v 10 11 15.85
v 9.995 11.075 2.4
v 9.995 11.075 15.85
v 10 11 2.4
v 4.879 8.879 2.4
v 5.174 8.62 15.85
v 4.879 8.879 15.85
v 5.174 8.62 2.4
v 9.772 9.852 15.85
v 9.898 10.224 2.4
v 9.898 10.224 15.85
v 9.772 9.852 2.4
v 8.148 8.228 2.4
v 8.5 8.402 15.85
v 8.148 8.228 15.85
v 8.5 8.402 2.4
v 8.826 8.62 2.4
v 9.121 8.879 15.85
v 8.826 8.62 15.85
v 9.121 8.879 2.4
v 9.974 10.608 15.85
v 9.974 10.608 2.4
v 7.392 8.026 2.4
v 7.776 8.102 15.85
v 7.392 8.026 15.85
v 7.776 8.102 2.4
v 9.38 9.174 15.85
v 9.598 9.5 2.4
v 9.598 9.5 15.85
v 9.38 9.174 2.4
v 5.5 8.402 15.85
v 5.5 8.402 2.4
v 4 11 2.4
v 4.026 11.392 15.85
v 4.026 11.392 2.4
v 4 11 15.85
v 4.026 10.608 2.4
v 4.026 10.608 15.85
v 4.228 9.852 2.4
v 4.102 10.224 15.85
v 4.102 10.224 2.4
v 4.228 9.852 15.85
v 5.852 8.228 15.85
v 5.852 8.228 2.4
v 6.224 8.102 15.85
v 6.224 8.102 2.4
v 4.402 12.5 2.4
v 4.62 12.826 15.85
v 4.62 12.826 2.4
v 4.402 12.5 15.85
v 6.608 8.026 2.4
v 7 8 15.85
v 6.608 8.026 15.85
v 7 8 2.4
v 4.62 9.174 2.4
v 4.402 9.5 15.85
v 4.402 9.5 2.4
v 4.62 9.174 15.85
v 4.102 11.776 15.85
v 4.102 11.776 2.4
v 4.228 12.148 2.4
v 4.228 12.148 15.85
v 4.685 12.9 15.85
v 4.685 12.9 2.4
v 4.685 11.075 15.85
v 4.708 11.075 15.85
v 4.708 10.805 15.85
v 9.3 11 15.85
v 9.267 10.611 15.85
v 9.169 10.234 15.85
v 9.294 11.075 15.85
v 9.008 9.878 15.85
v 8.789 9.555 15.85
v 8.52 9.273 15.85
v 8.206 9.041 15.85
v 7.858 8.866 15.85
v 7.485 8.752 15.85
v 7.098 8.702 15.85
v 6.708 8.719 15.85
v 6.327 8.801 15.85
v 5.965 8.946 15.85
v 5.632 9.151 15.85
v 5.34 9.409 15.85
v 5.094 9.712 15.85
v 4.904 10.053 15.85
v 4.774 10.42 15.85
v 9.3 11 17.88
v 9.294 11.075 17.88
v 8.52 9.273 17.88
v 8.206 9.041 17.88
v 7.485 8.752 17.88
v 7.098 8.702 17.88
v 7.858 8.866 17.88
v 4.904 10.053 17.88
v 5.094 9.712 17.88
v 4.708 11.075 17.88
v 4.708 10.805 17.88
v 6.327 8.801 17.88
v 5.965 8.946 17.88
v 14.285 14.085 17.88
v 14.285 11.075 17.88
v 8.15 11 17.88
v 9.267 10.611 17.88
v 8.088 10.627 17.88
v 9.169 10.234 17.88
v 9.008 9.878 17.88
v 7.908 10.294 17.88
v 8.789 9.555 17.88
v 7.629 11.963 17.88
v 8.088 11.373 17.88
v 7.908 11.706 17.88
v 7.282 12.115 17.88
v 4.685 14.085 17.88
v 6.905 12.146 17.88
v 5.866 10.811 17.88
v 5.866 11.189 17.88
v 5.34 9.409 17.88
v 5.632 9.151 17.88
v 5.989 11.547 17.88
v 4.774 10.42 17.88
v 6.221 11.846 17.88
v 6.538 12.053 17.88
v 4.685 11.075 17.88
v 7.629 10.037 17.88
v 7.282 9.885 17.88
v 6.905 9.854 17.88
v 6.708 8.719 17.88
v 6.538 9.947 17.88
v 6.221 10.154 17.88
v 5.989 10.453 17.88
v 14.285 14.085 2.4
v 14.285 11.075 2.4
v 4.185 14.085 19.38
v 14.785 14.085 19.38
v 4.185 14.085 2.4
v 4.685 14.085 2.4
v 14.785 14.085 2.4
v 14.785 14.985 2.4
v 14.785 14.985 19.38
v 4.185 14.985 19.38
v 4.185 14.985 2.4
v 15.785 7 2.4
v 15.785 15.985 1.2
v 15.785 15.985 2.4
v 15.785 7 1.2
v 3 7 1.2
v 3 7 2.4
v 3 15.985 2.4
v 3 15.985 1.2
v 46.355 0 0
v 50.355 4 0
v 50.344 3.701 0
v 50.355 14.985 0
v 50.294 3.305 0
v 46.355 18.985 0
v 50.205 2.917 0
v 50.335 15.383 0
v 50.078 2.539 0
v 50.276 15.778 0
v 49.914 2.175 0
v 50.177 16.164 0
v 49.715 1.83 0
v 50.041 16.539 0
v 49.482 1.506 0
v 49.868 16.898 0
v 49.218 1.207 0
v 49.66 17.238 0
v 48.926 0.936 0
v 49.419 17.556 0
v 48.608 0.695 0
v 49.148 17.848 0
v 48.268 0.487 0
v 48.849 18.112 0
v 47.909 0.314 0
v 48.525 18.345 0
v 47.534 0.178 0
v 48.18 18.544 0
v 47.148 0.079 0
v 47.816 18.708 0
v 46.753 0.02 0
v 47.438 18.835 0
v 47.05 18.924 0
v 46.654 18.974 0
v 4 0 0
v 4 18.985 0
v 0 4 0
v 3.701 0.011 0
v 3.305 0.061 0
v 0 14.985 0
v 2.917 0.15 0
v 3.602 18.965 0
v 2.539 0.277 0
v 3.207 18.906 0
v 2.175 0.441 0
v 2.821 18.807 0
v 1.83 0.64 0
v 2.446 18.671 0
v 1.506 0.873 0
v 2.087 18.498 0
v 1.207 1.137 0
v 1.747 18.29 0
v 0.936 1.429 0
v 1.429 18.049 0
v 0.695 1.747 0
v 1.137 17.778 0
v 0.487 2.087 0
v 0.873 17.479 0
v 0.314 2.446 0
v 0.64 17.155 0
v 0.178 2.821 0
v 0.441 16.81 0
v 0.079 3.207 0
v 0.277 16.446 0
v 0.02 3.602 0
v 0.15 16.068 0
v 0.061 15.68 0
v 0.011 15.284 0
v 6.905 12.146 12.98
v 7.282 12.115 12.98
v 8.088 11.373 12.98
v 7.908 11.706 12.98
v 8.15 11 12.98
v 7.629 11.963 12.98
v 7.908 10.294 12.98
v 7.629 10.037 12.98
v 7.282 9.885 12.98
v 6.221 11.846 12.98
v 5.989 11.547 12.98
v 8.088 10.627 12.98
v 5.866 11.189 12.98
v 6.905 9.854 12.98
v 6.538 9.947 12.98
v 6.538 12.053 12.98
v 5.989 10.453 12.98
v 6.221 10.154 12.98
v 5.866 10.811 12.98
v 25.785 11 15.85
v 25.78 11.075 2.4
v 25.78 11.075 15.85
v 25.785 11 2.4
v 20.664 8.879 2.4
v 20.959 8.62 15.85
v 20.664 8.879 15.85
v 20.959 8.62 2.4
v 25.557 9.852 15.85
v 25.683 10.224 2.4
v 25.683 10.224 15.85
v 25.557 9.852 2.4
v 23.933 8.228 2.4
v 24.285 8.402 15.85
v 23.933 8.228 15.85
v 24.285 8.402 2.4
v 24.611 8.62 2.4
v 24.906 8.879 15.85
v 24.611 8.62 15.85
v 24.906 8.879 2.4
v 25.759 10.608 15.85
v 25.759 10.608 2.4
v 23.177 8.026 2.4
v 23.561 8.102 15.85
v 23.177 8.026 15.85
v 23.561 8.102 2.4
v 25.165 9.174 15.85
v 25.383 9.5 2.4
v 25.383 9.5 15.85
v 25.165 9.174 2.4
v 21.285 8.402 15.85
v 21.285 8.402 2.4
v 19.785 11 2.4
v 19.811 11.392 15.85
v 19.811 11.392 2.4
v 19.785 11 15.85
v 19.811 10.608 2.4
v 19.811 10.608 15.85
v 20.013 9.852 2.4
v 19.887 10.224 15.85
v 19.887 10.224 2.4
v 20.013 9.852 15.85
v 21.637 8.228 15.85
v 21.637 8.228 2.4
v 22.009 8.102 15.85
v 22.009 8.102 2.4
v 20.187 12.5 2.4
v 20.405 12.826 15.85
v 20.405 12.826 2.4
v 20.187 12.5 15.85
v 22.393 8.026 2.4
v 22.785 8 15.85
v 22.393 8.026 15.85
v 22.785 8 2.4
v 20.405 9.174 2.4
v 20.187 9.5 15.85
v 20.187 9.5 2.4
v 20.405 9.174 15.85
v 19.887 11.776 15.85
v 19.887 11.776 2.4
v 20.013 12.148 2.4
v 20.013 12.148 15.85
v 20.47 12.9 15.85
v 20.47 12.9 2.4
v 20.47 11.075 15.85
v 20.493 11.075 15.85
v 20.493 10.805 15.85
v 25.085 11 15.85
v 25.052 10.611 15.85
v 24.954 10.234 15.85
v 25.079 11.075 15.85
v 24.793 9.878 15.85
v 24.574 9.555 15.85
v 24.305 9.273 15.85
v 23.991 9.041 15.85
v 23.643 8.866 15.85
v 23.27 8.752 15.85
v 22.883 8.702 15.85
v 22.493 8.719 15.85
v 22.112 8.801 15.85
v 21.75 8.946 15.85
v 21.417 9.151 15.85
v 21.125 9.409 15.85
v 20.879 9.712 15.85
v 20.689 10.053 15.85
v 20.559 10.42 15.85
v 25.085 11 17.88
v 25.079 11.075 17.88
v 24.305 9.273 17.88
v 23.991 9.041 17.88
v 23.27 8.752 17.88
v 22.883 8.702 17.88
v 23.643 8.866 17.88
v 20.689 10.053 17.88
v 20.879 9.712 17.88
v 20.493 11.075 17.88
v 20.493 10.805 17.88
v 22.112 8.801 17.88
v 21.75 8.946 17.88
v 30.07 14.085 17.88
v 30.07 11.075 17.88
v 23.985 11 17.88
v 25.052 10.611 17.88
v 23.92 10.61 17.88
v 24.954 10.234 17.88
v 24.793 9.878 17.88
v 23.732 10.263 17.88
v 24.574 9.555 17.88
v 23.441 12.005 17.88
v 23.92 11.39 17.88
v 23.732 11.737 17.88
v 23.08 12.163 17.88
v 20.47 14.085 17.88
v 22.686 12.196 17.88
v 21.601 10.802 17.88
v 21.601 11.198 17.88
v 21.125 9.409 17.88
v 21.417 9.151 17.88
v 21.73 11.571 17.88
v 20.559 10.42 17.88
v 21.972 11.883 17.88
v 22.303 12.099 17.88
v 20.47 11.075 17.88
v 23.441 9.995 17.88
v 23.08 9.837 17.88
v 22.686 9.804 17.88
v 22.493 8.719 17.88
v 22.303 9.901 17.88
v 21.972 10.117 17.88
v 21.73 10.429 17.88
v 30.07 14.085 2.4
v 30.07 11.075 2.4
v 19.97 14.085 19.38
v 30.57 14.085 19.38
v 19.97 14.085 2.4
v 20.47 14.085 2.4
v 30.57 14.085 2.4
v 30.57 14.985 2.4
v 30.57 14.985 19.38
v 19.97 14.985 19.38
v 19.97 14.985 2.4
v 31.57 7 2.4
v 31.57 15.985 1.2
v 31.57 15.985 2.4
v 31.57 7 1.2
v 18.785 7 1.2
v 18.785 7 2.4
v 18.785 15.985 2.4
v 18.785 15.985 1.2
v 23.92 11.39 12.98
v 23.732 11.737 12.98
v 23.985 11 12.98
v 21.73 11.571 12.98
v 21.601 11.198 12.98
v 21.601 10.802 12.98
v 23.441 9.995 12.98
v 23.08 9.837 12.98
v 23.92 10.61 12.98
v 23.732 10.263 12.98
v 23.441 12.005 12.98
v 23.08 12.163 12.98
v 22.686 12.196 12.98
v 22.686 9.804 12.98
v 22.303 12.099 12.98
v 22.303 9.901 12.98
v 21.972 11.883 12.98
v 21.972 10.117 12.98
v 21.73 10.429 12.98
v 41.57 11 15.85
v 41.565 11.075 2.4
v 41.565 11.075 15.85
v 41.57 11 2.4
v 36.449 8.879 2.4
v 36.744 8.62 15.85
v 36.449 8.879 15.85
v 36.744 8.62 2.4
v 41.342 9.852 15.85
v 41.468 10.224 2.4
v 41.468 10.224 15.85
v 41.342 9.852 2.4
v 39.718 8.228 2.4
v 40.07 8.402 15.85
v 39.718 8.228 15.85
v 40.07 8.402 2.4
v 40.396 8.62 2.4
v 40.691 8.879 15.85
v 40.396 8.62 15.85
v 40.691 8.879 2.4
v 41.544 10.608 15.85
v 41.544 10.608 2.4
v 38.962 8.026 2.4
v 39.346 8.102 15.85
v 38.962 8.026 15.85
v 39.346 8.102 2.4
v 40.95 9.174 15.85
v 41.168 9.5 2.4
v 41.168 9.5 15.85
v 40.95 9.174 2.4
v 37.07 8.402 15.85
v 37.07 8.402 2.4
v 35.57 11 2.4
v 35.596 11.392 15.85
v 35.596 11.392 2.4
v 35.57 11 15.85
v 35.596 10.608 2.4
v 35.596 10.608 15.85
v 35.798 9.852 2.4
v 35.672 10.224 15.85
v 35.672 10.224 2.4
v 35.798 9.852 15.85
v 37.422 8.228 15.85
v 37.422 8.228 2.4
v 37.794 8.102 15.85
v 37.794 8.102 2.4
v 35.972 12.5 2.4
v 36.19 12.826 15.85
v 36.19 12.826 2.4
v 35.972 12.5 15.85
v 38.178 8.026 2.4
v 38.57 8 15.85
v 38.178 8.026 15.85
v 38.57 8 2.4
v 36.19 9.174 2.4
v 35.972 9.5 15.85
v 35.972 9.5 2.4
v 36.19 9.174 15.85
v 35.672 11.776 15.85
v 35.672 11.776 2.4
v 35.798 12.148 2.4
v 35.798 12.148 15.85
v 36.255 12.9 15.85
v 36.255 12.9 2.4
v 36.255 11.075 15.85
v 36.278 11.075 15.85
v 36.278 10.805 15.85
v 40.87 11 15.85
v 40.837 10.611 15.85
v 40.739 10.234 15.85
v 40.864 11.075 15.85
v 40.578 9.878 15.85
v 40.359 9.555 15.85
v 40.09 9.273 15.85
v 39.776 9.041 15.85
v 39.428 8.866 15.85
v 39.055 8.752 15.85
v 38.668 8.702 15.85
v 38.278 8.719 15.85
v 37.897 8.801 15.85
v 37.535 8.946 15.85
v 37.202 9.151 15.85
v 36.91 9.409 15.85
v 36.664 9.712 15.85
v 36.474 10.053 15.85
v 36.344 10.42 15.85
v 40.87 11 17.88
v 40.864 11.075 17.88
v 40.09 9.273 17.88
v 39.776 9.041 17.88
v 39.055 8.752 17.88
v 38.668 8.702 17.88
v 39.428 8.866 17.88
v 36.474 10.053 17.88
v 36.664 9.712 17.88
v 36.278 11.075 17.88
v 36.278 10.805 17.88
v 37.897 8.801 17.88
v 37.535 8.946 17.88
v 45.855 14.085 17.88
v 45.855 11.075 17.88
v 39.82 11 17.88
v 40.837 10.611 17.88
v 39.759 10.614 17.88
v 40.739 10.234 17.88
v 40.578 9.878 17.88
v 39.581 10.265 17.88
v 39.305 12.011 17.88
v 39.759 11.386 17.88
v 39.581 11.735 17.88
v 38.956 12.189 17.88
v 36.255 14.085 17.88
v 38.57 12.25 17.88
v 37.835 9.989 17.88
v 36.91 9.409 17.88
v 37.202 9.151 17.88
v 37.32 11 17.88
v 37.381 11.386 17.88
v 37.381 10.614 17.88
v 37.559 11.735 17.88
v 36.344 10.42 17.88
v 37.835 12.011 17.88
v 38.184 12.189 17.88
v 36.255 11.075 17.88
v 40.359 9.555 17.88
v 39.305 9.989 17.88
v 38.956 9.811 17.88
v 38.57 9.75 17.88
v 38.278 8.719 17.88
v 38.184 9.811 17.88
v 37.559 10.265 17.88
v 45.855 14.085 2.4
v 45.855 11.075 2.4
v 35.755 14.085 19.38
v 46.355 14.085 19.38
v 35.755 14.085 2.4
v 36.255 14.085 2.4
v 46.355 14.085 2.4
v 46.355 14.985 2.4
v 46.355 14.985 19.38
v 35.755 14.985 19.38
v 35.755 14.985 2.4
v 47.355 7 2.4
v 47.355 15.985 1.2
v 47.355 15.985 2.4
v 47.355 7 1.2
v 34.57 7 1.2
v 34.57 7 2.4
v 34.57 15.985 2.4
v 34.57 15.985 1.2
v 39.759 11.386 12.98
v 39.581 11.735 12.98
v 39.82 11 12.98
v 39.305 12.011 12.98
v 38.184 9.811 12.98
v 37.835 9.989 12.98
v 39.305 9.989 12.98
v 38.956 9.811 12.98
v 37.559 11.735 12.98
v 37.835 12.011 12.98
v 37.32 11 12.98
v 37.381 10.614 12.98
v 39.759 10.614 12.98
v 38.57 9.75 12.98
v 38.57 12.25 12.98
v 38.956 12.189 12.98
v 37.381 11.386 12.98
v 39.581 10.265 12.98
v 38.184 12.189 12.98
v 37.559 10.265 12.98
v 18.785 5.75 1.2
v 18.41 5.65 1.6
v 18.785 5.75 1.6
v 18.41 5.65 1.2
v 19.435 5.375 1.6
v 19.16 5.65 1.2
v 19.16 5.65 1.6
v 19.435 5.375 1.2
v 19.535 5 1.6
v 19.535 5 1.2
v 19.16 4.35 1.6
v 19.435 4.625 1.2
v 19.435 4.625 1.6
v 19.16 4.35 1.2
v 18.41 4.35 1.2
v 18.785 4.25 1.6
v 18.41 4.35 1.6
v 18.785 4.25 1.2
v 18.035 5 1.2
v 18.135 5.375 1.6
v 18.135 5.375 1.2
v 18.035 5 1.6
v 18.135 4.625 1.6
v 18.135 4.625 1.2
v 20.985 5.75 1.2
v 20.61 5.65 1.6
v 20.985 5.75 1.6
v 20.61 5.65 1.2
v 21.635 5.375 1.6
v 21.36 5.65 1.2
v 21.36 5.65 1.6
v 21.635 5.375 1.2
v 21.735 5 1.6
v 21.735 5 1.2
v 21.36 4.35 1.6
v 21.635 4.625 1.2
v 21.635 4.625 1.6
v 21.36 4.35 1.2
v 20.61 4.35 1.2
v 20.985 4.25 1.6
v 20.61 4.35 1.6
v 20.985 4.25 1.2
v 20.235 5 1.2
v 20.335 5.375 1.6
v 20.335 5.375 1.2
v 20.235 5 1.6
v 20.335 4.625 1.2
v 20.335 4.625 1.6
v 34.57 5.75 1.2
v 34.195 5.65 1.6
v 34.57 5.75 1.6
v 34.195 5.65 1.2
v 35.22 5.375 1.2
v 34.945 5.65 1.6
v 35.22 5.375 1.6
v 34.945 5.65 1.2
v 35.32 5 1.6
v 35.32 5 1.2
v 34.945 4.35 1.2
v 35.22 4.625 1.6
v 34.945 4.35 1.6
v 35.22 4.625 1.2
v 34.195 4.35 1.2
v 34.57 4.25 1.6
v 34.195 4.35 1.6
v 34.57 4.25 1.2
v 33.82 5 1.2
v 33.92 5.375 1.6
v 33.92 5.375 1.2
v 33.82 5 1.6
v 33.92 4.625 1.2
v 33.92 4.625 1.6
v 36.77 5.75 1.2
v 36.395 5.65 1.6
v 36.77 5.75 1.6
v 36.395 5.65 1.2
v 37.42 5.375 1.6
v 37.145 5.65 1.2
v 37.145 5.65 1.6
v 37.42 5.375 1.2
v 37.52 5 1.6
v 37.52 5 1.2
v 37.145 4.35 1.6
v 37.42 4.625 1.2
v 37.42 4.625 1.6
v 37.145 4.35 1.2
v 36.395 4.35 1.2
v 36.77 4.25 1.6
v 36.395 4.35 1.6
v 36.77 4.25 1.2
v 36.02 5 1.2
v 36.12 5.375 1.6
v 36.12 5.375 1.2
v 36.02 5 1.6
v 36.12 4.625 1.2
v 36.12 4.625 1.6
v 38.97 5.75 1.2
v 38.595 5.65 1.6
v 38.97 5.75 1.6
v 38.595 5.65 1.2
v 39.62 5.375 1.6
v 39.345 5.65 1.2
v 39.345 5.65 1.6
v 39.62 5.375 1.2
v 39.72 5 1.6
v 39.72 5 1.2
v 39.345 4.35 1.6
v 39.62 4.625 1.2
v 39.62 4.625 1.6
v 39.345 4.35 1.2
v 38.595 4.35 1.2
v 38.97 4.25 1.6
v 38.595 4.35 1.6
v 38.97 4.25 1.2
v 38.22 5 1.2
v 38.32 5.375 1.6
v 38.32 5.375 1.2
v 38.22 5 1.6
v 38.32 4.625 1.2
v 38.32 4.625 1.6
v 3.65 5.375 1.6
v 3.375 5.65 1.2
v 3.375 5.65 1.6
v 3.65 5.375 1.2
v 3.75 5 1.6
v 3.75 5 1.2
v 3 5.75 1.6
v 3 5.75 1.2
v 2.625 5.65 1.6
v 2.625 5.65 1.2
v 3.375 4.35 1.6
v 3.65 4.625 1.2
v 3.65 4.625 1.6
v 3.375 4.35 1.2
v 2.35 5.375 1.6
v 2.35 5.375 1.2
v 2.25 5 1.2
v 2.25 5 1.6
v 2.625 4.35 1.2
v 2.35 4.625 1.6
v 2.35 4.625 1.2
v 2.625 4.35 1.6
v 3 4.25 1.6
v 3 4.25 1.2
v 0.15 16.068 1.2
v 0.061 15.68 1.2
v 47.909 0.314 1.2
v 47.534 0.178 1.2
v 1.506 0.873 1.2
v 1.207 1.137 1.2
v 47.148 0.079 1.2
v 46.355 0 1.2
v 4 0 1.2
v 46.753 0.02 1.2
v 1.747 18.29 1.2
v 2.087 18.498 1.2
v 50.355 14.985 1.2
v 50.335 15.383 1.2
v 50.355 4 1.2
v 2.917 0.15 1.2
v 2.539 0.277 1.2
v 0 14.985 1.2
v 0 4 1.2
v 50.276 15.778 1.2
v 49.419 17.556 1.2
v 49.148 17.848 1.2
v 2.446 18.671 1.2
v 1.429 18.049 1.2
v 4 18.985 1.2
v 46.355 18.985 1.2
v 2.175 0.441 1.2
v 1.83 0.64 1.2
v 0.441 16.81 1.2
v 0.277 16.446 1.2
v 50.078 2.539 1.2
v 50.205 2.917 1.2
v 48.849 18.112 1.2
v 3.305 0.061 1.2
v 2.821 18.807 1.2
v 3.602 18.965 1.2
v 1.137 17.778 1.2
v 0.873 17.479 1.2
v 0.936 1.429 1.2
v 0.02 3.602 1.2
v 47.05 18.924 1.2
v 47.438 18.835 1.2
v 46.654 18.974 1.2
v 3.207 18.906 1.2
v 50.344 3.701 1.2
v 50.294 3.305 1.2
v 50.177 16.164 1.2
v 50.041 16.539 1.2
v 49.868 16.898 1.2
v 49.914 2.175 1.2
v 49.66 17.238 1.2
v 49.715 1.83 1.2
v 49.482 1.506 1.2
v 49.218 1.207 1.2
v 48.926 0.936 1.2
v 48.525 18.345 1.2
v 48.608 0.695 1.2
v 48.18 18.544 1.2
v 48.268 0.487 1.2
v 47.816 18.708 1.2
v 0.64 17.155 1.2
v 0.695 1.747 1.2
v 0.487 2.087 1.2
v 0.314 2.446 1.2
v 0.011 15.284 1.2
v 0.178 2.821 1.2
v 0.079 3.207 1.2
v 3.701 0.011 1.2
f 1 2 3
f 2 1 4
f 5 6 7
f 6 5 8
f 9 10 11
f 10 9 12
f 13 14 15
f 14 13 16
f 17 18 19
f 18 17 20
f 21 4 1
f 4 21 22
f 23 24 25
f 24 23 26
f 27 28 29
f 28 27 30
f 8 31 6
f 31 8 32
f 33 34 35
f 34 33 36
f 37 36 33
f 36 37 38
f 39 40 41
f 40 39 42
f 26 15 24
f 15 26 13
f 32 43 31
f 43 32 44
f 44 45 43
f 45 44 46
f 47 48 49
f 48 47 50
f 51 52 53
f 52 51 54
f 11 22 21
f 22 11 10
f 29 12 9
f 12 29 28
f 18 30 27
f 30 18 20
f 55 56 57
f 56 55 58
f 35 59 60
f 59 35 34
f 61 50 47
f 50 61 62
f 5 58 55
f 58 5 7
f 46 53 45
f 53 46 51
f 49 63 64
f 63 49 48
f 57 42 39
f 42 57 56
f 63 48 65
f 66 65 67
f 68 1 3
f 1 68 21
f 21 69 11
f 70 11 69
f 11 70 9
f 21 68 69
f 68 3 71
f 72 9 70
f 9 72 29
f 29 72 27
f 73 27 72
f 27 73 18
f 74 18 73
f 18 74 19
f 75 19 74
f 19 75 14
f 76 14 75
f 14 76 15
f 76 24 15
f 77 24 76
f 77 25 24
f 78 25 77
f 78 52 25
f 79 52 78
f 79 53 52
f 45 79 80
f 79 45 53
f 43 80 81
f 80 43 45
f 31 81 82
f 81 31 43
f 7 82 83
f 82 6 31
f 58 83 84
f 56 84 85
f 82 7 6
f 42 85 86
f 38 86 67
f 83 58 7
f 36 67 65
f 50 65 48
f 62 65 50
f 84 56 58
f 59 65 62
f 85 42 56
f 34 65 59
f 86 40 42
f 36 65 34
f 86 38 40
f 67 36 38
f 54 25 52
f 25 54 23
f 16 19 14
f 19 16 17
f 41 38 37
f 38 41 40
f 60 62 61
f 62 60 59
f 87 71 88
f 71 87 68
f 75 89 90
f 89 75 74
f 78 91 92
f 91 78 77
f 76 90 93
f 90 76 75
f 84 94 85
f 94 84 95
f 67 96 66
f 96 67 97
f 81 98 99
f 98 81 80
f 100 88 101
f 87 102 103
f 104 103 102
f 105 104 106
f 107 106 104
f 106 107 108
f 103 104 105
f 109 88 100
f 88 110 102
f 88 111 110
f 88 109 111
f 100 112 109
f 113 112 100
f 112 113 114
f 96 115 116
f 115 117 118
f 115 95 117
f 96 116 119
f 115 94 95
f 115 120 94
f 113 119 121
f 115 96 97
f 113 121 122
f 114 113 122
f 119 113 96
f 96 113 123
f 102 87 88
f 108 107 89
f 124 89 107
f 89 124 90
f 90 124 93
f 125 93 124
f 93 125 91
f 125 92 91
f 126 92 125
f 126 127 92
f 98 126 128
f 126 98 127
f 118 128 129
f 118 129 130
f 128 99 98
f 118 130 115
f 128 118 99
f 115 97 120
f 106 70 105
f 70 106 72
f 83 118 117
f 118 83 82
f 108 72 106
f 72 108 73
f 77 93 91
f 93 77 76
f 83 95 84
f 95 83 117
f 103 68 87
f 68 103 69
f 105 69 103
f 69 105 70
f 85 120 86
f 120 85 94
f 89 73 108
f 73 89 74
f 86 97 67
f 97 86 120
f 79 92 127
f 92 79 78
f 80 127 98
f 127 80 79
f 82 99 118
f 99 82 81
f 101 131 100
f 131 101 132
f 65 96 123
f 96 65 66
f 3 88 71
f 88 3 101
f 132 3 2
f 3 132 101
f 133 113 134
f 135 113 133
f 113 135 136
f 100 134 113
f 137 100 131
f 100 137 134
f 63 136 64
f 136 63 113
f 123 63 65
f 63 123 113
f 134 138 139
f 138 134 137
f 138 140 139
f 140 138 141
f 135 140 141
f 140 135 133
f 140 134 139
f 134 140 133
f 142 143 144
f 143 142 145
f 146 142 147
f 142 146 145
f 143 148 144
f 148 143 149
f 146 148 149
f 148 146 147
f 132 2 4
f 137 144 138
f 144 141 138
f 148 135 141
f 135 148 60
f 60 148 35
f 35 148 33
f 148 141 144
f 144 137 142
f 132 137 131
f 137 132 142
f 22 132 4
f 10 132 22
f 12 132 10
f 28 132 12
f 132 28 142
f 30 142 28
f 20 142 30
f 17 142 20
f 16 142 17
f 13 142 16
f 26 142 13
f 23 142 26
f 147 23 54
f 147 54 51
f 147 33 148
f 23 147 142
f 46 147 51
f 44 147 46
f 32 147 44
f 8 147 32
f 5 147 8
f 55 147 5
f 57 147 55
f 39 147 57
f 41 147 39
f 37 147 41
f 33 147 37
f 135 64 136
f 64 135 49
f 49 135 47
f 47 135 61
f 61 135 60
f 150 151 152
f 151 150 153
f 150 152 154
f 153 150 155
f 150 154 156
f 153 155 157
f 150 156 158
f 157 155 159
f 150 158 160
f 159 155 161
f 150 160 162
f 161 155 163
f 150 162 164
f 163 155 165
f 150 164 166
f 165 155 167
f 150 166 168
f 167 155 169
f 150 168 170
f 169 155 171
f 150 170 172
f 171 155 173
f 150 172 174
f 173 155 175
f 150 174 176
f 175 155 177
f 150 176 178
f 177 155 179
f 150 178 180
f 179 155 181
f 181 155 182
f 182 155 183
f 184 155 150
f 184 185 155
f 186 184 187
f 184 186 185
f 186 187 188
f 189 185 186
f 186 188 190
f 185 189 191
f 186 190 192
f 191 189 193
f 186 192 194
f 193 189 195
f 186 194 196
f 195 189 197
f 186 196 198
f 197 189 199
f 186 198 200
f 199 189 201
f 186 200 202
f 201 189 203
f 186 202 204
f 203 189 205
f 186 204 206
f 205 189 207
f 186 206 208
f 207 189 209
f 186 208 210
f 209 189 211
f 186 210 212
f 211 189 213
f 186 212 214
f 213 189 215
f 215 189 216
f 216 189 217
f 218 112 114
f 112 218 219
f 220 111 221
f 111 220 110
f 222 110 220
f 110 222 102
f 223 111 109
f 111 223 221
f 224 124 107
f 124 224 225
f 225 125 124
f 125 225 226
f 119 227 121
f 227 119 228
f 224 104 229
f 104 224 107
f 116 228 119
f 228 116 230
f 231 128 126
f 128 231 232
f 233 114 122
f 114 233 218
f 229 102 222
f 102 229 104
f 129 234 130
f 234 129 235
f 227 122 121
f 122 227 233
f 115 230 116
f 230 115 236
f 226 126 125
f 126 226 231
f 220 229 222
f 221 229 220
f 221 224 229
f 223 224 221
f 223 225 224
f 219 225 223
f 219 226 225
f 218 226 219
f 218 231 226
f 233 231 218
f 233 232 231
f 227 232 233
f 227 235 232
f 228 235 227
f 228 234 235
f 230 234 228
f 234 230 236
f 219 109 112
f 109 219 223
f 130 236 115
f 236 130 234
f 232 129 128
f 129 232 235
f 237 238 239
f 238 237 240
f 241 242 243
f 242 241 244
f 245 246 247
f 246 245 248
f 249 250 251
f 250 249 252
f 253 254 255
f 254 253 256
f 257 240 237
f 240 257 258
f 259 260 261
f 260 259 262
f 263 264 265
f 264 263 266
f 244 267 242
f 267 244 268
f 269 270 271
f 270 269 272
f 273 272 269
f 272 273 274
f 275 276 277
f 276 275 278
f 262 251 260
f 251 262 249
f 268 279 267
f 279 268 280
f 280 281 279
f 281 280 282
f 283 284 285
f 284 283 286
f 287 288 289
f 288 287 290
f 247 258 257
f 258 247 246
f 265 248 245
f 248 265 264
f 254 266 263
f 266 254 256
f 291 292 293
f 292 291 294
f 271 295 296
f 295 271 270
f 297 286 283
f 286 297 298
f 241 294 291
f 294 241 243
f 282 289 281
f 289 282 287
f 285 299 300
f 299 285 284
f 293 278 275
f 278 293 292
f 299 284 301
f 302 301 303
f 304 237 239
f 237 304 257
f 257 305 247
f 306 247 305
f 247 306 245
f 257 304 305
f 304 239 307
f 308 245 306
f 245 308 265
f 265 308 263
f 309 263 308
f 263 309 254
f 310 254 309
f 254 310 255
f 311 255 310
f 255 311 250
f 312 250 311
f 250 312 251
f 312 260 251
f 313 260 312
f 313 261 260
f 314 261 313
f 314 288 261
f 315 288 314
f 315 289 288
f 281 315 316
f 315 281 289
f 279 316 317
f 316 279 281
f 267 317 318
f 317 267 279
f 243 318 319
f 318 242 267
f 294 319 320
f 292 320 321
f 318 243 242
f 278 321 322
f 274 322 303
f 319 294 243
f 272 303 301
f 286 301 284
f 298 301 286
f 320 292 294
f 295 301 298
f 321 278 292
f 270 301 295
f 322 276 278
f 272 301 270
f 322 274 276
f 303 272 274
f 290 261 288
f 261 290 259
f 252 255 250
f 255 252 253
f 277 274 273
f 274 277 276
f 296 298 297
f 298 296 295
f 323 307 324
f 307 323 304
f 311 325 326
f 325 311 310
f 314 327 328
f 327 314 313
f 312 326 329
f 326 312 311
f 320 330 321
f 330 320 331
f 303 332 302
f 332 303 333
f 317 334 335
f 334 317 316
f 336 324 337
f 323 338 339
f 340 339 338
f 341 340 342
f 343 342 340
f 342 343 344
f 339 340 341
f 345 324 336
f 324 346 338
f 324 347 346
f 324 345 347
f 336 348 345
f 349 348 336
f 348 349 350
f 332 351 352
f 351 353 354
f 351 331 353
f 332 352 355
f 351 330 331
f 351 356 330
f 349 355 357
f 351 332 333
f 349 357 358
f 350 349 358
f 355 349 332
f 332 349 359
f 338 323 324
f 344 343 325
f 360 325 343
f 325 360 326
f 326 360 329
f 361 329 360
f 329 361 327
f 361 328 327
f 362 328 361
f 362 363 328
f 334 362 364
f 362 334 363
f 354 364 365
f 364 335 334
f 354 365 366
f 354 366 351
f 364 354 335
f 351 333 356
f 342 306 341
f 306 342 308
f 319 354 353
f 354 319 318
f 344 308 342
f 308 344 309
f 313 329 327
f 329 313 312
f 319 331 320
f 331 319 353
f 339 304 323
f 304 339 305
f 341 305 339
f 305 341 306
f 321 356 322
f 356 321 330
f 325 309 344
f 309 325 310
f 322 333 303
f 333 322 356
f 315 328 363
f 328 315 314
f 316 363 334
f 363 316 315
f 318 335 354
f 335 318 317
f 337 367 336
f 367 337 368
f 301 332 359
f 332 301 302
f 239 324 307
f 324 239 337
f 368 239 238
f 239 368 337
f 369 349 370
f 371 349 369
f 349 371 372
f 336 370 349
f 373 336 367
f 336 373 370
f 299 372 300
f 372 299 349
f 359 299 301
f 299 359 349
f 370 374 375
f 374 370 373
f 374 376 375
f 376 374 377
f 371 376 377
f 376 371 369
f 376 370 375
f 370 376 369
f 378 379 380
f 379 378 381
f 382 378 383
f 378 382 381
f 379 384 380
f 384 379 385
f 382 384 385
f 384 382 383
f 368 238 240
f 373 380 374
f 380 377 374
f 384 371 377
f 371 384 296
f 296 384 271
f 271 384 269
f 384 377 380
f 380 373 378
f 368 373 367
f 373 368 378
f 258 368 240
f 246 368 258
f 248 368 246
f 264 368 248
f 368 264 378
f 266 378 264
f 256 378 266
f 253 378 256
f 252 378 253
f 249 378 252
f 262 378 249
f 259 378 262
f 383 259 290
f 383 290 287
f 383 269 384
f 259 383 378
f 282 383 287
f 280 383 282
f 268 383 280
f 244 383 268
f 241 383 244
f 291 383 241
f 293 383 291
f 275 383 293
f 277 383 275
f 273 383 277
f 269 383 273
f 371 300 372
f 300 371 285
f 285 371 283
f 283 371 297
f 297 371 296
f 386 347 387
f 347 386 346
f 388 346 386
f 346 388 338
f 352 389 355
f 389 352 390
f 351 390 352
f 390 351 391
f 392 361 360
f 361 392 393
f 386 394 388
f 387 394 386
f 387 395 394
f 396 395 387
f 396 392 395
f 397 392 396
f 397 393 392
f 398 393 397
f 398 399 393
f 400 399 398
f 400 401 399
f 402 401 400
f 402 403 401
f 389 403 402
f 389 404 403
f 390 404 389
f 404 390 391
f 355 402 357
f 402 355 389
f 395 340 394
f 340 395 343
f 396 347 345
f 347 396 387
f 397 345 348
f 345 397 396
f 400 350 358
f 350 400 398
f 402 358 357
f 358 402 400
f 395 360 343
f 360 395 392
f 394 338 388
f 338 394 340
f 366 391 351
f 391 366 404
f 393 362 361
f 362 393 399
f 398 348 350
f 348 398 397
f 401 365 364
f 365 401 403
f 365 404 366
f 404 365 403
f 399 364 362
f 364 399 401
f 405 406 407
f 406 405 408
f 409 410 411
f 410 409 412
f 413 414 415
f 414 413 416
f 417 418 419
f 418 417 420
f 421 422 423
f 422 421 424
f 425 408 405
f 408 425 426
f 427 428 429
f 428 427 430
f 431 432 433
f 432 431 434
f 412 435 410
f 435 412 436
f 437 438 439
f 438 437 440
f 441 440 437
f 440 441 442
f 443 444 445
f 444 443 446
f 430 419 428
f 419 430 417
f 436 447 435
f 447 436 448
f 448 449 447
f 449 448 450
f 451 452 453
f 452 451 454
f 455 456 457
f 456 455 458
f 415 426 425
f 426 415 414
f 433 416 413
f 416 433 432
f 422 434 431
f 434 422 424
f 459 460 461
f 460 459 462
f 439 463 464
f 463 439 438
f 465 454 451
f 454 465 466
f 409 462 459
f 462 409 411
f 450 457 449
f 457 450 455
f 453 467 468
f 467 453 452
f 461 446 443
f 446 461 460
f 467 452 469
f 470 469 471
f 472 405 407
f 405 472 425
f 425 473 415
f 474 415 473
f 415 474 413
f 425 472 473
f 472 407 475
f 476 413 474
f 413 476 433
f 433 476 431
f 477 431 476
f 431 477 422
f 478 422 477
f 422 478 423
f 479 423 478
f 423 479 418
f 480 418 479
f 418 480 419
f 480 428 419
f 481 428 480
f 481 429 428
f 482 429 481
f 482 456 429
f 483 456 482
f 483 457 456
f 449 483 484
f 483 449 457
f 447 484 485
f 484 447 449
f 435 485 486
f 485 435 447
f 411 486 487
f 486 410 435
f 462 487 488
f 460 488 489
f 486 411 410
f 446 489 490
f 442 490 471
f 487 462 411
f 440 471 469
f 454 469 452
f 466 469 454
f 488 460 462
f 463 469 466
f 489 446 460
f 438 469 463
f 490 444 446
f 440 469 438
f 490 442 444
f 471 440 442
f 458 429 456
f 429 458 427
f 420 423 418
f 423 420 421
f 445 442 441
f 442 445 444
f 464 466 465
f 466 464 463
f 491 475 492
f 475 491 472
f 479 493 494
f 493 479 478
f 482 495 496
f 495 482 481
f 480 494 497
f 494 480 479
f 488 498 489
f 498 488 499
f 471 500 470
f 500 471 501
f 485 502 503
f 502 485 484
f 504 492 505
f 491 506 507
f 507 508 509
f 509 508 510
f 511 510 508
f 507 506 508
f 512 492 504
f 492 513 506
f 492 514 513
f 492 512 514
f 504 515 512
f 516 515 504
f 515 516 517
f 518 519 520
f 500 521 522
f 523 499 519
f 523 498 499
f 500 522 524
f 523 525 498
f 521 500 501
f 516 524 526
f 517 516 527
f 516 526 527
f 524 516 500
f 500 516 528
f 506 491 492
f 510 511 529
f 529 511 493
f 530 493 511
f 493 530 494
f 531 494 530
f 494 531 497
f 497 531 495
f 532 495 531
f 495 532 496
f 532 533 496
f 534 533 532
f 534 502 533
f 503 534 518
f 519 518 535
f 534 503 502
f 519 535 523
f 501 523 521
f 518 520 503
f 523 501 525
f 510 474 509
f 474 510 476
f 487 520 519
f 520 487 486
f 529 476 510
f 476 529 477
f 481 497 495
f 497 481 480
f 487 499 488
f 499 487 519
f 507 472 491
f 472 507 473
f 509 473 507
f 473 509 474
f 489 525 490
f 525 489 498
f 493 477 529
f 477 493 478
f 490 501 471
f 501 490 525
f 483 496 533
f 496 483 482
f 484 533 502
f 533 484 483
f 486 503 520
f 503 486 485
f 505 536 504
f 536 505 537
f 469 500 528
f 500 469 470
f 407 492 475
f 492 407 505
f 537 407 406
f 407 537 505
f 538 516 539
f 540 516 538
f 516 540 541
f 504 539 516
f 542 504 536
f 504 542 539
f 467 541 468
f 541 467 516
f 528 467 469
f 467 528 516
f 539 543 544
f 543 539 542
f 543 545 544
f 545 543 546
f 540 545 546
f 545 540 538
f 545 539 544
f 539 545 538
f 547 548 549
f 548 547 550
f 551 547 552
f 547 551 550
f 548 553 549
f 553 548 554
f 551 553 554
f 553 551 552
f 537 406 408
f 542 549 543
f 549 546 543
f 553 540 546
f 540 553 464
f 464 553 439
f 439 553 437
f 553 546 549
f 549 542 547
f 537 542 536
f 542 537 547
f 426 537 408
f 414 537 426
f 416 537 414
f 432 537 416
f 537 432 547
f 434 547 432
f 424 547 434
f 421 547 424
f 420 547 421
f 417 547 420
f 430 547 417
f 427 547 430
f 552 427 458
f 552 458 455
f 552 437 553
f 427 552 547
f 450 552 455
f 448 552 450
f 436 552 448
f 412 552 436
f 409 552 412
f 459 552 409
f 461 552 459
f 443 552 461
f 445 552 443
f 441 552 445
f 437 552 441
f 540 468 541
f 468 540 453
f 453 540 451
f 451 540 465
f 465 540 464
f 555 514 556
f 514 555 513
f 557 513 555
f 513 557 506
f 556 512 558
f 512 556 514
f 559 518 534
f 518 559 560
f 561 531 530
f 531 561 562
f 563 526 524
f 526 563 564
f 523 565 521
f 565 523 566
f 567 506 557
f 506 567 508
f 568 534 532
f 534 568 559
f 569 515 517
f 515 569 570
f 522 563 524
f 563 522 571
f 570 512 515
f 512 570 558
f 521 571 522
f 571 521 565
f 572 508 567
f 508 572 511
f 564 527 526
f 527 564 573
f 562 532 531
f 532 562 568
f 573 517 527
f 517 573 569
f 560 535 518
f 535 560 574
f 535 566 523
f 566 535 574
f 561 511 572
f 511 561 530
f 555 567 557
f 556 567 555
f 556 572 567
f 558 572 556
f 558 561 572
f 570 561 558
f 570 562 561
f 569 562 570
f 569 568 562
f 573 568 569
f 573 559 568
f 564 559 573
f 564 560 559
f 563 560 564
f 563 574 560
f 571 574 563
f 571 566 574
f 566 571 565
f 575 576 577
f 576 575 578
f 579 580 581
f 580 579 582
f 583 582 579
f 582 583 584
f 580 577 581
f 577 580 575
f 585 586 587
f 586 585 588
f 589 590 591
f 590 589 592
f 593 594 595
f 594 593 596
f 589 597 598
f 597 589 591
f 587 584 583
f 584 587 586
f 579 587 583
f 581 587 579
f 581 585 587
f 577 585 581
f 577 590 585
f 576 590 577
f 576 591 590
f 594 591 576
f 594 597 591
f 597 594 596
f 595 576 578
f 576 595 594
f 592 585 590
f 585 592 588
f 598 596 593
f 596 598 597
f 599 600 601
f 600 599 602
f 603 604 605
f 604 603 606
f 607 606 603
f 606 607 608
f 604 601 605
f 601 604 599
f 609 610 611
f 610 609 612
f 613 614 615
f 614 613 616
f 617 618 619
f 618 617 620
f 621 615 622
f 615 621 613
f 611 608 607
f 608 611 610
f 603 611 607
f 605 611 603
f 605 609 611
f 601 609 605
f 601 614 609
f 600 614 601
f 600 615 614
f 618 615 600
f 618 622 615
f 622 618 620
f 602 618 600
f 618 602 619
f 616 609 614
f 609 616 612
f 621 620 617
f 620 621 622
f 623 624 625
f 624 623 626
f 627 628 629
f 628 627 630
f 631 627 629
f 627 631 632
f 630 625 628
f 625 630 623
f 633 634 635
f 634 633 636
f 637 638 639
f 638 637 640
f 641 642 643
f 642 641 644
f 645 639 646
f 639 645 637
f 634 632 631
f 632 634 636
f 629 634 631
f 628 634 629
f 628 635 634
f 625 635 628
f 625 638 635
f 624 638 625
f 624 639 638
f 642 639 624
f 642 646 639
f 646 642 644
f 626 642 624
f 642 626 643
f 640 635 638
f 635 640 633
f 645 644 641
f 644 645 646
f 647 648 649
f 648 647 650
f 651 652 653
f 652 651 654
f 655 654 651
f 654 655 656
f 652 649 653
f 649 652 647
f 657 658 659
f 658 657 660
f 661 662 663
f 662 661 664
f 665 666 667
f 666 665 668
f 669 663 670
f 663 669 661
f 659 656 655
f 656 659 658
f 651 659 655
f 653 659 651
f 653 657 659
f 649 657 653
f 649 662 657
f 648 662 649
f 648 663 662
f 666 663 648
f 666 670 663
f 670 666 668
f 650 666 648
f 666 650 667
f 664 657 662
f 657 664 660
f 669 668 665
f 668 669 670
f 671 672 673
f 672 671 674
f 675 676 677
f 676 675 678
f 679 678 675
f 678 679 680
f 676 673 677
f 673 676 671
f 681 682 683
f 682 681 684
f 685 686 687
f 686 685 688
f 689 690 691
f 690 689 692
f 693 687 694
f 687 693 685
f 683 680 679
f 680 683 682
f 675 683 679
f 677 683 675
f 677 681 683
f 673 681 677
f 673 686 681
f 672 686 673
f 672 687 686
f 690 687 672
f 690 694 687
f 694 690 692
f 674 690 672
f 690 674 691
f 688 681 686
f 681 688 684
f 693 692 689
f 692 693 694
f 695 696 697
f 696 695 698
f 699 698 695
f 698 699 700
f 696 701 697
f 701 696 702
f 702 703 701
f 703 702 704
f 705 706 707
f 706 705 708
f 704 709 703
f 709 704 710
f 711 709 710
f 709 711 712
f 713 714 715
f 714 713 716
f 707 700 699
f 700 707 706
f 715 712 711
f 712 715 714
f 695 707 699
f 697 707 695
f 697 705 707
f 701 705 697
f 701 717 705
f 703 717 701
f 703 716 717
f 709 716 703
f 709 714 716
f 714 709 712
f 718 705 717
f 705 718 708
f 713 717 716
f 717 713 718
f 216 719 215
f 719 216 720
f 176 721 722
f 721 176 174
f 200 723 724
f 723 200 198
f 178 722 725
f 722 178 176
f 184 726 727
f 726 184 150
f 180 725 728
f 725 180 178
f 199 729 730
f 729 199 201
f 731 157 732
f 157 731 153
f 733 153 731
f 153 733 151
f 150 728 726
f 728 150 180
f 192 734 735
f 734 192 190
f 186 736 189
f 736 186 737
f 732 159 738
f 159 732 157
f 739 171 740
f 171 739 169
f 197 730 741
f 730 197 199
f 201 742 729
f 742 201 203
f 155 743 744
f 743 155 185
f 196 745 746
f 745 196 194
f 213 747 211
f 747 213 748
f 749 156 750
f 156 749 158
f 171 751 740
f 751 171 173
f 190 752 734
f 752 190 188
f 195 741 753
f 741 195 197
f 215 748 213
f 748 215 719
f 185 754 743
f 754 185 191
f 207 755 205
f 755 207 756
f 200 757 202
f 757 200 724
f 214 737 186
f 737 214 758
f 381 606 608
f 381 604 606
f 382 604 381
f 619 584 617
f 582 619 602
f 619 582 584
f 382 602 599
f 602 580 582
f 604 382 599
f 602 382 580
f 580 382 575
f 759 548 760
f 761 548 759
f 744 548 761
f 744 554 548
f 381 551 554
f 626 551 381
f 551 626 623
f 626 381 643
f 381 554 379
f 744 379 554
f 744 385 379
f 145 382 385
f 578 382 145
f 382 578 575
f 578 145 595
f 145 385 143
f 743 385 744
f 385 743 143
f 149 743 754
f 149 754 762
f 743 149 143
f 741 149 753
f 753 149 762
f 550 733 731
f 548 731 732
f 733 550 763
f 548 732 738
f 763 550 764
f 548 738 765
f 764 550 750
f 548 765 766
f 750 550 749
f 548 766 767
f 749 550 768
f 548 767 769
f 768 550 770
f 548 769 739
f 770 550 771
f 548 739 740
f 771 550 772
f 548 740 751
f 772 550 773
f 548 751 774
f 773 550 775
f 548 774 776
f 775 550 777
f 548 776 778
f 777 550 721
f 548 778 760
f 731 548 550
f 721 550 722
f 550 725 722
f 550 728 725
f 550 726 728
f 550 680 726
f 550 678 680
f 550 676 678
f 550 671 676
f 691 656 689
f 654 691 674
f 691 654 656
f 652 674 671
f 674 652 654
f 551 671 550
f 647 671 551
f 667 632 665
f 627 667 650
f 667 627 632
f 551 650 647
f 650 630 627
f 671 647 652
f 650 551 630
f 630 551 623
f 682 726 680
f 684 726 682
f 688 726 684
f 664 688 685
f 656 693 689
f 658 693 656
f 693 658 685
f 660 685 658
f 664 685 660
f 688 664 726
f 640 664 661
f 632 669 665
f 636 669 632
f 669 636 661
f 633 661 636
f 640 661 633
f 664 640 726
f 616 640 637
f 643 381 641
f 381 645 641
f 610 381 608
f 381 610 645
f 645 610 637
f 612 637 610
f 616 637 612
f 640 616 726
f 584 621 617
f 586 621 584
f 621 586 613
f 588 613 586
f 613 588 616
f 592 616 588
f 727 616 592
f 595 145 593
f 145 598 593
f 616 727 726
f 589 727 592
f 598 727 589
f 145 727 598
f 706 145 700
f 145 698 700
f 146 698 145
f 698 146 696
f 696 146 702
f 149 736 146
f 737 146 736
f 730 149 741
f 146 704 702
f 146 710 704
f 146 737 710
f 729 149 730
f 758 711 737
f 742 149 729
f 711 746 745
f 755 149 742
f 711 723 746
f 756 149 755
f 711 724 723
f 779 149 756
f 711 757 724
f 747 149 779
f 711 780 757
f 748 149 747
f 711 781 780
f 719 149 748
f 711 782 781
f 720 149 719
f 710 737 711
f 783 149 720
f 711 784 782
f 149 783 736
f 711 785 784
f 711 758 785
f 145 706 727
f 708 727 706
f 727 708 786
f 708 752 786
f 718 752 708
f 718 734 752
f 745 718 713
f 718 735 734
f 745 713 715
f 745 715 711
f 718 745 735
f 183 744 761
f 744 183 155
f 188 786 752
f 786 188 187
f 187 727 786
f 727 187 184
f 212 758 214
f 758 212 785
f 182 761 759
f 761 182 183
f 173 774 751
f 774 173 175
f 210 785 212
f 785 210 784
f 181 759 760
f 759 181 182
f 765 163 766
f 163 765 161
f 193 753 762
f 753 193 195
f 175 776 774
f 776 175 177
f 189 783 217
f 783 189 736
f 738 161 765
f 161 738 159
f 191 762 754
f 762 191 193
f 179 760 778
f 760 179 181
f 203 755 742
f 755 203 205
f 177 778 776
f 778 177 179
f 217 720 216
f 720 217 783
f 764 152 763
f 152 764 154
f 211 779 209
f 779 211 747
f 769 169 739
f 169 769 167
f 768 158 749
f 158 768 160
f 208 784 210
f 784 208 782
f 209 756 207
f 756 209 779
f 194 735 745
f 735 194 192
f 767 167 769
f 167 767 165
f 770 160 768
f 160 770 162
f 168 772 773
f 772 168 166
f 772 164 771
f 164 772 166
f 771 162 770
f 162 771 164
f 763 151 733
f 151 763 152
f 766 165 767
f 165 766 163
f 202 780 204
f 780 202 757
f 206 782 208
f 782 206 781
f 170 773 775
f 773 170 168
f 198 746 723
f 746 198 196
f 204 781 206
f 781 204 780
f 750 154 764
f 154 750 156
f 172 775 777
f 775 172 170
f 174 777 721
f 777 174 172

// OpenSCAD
// SPDX-FileCopyrightText: 2026 Alon A. Rabinowitz
// SPDX-License-Identifier: CERN-OHL-S-2.0
// Open hardware, made available under the CERN Open Hardware Licence v2 - Strongly Reciprocal
// (LICENSES/CERN-OHL-S-2.0.txt), without any express or implied warranty: see the licence for its conditions.

/*
The clearance test for the air-quality monitor: one small print that tries every untested fit in
air-quality-monitor.params.scad at three settings - a step tighter, as set, and a step looser - so the box
is printed with fits that were tried in ASA on this printer rather than guessed.

It INCLUDES the box, and every piece is the box's own geometry, drawn by the box's own modules with only
the fit changed and turned onto the bed as the back plate is. So the test cannot drift from what it
tests, and each piece prints the way it will in the box. Each try carries 1, 2 or 3 dots: 1 = a step
tighter, 2 = as set, 3 = a step looser. docs/clearance-test.md says what to try with each, how to turn
the result into a setting, and what has been found so far.

  M  gy_pilot_d   three of the SGP41's mounts - post, rib and ledge - each with its pilot upright

This is the third round. The first two, of 2 Oct and 3 Oct 2026, settled every other fit; their pieces
are in the history.

draw_fits = false after including this file draws nothing, as fits-map.scad does.
*/
include <../air-quality-monitor.scad>
draw_model = false;   // after the include: the box's own parts stay undrawn
draw_fits = true;

fit_step = 0.1;             // the step for every fit here
m = 3;                      // margin round and between the pieces
row = 4;                    // gap in front of each try, towards the printer's front; its dots sit in it
dot_d = 1.5;                // the tags: about three beads across, two layers proud
base_t = 6 * fdm_layer_h;   // 1.2 mm: the floor everything stands on

function ladder(v, s) = [v - s, v, v + s];
// Smaller is tighter. No hole may go under 2 mm (the rules below), so with the pilot at 2.0 the ladder
// starts there instead: 1 dot is then the setting itself.
gy_pilots = ladder(max(gy_pilot_d, 2 + fit_step), fit_step);

// The box's geometry is drawn in its own frame - X across, Y out from the wall, Z up - and the back plate
// prints flat on its back. This is the turn its part file makes: the box's Y comes up off the bed.
module to_bed() rotate([90, 0, 0]) children();

// ------------------------------------------------------------------ M: the SGP41's mounts
// The box's post, rib and ledge, on as much plate as they stand on, the pilot down the post. Screwed on,
// the module reaches past the pad towards the printer's front, above the dots.
m_x0 = min(gy_hx - gy_post_d / 2, gy_x0) - 1;        // the pad, in the box's frame
m_x1 = max(gy_hx + gy_post_d / 2, gy_x1) + 1;
m_z0 = gy_z0 - pocket_fit - rim_t - 1;
m_z1 = max(gy_hz + gy_post_d / 2, gy_rib_z1) + 1;
module m_piece(d) difference() {                    // in the box's frame
    union() {
        gy_mount();
        box3([m_x0, 0, m_z0], [m_x1, back_t, m_z1]);
    }
    gy_pilot(d);
}

// ------------------------------------------------------------------ layout: one row
m_w  = m_x1 - m_x0;                         // a piece across, on the bed
m_d  = m_z1 - m_z0;                         // and front to back
m_y  = m + row;                             // each pad's front edge
m_xs = [for (i = [0 : 2]) m + i * (m_w + m)];
BW = m + 3 * m_w + 2 * m + m;
BH = m_y + m_d + m;

// ------------------------------------------------------------------ the rules
assert(min(gy_pilots) >= 2, "a hole under 2 mm distorts or closes up - fdm-design-rules §2");
assert(whole(base_t / fdm_layer_h), "printed flat: whole layers only");

// ------------------------------------------------------------------ pieces
module tag(n, x, y, z = base_t)
    for (i = [0 : n - 1])
        translate([x + i * (dot_d + 0.7), y + dot_d / 2, z - eps]) cylinder(d = dot_d, h = 2 * fdm_layer_h + eps);

// every try's dots, in the gap in front of it - a module of their own, so fits-map.scad can show them in a
// colour
module tags() for (i = [0 : 2]) tag(i + 1, m_xs[i], m_y - row / 2 - dot_d / 2);

// ------------------------------------------------------------------ the part
module fits() union() {
    // the base, corners rounded against ASA's lifting
    linear_extrude(height = base_t) offset(r = corner_r) offset(delta = -corner_r) square([BW, BH]);
    for (i = [0 : 2]) translate([m_xs[i] - m_x0, m_y + m_z1, 0]) to_bed() m_piece(gy_pilots[i]);
    tags();
}

echo(str("clearance test: ", BW, " x ", BH, " mm base; dots 1 / 2 / 3 = a step tighter / as set / a step looser"));
echo(str("  M gy_pilot_d ", gy_pilots, ", the post's top ", gy_standoff_d, " mm across"));

if (draw_fits) fits();
